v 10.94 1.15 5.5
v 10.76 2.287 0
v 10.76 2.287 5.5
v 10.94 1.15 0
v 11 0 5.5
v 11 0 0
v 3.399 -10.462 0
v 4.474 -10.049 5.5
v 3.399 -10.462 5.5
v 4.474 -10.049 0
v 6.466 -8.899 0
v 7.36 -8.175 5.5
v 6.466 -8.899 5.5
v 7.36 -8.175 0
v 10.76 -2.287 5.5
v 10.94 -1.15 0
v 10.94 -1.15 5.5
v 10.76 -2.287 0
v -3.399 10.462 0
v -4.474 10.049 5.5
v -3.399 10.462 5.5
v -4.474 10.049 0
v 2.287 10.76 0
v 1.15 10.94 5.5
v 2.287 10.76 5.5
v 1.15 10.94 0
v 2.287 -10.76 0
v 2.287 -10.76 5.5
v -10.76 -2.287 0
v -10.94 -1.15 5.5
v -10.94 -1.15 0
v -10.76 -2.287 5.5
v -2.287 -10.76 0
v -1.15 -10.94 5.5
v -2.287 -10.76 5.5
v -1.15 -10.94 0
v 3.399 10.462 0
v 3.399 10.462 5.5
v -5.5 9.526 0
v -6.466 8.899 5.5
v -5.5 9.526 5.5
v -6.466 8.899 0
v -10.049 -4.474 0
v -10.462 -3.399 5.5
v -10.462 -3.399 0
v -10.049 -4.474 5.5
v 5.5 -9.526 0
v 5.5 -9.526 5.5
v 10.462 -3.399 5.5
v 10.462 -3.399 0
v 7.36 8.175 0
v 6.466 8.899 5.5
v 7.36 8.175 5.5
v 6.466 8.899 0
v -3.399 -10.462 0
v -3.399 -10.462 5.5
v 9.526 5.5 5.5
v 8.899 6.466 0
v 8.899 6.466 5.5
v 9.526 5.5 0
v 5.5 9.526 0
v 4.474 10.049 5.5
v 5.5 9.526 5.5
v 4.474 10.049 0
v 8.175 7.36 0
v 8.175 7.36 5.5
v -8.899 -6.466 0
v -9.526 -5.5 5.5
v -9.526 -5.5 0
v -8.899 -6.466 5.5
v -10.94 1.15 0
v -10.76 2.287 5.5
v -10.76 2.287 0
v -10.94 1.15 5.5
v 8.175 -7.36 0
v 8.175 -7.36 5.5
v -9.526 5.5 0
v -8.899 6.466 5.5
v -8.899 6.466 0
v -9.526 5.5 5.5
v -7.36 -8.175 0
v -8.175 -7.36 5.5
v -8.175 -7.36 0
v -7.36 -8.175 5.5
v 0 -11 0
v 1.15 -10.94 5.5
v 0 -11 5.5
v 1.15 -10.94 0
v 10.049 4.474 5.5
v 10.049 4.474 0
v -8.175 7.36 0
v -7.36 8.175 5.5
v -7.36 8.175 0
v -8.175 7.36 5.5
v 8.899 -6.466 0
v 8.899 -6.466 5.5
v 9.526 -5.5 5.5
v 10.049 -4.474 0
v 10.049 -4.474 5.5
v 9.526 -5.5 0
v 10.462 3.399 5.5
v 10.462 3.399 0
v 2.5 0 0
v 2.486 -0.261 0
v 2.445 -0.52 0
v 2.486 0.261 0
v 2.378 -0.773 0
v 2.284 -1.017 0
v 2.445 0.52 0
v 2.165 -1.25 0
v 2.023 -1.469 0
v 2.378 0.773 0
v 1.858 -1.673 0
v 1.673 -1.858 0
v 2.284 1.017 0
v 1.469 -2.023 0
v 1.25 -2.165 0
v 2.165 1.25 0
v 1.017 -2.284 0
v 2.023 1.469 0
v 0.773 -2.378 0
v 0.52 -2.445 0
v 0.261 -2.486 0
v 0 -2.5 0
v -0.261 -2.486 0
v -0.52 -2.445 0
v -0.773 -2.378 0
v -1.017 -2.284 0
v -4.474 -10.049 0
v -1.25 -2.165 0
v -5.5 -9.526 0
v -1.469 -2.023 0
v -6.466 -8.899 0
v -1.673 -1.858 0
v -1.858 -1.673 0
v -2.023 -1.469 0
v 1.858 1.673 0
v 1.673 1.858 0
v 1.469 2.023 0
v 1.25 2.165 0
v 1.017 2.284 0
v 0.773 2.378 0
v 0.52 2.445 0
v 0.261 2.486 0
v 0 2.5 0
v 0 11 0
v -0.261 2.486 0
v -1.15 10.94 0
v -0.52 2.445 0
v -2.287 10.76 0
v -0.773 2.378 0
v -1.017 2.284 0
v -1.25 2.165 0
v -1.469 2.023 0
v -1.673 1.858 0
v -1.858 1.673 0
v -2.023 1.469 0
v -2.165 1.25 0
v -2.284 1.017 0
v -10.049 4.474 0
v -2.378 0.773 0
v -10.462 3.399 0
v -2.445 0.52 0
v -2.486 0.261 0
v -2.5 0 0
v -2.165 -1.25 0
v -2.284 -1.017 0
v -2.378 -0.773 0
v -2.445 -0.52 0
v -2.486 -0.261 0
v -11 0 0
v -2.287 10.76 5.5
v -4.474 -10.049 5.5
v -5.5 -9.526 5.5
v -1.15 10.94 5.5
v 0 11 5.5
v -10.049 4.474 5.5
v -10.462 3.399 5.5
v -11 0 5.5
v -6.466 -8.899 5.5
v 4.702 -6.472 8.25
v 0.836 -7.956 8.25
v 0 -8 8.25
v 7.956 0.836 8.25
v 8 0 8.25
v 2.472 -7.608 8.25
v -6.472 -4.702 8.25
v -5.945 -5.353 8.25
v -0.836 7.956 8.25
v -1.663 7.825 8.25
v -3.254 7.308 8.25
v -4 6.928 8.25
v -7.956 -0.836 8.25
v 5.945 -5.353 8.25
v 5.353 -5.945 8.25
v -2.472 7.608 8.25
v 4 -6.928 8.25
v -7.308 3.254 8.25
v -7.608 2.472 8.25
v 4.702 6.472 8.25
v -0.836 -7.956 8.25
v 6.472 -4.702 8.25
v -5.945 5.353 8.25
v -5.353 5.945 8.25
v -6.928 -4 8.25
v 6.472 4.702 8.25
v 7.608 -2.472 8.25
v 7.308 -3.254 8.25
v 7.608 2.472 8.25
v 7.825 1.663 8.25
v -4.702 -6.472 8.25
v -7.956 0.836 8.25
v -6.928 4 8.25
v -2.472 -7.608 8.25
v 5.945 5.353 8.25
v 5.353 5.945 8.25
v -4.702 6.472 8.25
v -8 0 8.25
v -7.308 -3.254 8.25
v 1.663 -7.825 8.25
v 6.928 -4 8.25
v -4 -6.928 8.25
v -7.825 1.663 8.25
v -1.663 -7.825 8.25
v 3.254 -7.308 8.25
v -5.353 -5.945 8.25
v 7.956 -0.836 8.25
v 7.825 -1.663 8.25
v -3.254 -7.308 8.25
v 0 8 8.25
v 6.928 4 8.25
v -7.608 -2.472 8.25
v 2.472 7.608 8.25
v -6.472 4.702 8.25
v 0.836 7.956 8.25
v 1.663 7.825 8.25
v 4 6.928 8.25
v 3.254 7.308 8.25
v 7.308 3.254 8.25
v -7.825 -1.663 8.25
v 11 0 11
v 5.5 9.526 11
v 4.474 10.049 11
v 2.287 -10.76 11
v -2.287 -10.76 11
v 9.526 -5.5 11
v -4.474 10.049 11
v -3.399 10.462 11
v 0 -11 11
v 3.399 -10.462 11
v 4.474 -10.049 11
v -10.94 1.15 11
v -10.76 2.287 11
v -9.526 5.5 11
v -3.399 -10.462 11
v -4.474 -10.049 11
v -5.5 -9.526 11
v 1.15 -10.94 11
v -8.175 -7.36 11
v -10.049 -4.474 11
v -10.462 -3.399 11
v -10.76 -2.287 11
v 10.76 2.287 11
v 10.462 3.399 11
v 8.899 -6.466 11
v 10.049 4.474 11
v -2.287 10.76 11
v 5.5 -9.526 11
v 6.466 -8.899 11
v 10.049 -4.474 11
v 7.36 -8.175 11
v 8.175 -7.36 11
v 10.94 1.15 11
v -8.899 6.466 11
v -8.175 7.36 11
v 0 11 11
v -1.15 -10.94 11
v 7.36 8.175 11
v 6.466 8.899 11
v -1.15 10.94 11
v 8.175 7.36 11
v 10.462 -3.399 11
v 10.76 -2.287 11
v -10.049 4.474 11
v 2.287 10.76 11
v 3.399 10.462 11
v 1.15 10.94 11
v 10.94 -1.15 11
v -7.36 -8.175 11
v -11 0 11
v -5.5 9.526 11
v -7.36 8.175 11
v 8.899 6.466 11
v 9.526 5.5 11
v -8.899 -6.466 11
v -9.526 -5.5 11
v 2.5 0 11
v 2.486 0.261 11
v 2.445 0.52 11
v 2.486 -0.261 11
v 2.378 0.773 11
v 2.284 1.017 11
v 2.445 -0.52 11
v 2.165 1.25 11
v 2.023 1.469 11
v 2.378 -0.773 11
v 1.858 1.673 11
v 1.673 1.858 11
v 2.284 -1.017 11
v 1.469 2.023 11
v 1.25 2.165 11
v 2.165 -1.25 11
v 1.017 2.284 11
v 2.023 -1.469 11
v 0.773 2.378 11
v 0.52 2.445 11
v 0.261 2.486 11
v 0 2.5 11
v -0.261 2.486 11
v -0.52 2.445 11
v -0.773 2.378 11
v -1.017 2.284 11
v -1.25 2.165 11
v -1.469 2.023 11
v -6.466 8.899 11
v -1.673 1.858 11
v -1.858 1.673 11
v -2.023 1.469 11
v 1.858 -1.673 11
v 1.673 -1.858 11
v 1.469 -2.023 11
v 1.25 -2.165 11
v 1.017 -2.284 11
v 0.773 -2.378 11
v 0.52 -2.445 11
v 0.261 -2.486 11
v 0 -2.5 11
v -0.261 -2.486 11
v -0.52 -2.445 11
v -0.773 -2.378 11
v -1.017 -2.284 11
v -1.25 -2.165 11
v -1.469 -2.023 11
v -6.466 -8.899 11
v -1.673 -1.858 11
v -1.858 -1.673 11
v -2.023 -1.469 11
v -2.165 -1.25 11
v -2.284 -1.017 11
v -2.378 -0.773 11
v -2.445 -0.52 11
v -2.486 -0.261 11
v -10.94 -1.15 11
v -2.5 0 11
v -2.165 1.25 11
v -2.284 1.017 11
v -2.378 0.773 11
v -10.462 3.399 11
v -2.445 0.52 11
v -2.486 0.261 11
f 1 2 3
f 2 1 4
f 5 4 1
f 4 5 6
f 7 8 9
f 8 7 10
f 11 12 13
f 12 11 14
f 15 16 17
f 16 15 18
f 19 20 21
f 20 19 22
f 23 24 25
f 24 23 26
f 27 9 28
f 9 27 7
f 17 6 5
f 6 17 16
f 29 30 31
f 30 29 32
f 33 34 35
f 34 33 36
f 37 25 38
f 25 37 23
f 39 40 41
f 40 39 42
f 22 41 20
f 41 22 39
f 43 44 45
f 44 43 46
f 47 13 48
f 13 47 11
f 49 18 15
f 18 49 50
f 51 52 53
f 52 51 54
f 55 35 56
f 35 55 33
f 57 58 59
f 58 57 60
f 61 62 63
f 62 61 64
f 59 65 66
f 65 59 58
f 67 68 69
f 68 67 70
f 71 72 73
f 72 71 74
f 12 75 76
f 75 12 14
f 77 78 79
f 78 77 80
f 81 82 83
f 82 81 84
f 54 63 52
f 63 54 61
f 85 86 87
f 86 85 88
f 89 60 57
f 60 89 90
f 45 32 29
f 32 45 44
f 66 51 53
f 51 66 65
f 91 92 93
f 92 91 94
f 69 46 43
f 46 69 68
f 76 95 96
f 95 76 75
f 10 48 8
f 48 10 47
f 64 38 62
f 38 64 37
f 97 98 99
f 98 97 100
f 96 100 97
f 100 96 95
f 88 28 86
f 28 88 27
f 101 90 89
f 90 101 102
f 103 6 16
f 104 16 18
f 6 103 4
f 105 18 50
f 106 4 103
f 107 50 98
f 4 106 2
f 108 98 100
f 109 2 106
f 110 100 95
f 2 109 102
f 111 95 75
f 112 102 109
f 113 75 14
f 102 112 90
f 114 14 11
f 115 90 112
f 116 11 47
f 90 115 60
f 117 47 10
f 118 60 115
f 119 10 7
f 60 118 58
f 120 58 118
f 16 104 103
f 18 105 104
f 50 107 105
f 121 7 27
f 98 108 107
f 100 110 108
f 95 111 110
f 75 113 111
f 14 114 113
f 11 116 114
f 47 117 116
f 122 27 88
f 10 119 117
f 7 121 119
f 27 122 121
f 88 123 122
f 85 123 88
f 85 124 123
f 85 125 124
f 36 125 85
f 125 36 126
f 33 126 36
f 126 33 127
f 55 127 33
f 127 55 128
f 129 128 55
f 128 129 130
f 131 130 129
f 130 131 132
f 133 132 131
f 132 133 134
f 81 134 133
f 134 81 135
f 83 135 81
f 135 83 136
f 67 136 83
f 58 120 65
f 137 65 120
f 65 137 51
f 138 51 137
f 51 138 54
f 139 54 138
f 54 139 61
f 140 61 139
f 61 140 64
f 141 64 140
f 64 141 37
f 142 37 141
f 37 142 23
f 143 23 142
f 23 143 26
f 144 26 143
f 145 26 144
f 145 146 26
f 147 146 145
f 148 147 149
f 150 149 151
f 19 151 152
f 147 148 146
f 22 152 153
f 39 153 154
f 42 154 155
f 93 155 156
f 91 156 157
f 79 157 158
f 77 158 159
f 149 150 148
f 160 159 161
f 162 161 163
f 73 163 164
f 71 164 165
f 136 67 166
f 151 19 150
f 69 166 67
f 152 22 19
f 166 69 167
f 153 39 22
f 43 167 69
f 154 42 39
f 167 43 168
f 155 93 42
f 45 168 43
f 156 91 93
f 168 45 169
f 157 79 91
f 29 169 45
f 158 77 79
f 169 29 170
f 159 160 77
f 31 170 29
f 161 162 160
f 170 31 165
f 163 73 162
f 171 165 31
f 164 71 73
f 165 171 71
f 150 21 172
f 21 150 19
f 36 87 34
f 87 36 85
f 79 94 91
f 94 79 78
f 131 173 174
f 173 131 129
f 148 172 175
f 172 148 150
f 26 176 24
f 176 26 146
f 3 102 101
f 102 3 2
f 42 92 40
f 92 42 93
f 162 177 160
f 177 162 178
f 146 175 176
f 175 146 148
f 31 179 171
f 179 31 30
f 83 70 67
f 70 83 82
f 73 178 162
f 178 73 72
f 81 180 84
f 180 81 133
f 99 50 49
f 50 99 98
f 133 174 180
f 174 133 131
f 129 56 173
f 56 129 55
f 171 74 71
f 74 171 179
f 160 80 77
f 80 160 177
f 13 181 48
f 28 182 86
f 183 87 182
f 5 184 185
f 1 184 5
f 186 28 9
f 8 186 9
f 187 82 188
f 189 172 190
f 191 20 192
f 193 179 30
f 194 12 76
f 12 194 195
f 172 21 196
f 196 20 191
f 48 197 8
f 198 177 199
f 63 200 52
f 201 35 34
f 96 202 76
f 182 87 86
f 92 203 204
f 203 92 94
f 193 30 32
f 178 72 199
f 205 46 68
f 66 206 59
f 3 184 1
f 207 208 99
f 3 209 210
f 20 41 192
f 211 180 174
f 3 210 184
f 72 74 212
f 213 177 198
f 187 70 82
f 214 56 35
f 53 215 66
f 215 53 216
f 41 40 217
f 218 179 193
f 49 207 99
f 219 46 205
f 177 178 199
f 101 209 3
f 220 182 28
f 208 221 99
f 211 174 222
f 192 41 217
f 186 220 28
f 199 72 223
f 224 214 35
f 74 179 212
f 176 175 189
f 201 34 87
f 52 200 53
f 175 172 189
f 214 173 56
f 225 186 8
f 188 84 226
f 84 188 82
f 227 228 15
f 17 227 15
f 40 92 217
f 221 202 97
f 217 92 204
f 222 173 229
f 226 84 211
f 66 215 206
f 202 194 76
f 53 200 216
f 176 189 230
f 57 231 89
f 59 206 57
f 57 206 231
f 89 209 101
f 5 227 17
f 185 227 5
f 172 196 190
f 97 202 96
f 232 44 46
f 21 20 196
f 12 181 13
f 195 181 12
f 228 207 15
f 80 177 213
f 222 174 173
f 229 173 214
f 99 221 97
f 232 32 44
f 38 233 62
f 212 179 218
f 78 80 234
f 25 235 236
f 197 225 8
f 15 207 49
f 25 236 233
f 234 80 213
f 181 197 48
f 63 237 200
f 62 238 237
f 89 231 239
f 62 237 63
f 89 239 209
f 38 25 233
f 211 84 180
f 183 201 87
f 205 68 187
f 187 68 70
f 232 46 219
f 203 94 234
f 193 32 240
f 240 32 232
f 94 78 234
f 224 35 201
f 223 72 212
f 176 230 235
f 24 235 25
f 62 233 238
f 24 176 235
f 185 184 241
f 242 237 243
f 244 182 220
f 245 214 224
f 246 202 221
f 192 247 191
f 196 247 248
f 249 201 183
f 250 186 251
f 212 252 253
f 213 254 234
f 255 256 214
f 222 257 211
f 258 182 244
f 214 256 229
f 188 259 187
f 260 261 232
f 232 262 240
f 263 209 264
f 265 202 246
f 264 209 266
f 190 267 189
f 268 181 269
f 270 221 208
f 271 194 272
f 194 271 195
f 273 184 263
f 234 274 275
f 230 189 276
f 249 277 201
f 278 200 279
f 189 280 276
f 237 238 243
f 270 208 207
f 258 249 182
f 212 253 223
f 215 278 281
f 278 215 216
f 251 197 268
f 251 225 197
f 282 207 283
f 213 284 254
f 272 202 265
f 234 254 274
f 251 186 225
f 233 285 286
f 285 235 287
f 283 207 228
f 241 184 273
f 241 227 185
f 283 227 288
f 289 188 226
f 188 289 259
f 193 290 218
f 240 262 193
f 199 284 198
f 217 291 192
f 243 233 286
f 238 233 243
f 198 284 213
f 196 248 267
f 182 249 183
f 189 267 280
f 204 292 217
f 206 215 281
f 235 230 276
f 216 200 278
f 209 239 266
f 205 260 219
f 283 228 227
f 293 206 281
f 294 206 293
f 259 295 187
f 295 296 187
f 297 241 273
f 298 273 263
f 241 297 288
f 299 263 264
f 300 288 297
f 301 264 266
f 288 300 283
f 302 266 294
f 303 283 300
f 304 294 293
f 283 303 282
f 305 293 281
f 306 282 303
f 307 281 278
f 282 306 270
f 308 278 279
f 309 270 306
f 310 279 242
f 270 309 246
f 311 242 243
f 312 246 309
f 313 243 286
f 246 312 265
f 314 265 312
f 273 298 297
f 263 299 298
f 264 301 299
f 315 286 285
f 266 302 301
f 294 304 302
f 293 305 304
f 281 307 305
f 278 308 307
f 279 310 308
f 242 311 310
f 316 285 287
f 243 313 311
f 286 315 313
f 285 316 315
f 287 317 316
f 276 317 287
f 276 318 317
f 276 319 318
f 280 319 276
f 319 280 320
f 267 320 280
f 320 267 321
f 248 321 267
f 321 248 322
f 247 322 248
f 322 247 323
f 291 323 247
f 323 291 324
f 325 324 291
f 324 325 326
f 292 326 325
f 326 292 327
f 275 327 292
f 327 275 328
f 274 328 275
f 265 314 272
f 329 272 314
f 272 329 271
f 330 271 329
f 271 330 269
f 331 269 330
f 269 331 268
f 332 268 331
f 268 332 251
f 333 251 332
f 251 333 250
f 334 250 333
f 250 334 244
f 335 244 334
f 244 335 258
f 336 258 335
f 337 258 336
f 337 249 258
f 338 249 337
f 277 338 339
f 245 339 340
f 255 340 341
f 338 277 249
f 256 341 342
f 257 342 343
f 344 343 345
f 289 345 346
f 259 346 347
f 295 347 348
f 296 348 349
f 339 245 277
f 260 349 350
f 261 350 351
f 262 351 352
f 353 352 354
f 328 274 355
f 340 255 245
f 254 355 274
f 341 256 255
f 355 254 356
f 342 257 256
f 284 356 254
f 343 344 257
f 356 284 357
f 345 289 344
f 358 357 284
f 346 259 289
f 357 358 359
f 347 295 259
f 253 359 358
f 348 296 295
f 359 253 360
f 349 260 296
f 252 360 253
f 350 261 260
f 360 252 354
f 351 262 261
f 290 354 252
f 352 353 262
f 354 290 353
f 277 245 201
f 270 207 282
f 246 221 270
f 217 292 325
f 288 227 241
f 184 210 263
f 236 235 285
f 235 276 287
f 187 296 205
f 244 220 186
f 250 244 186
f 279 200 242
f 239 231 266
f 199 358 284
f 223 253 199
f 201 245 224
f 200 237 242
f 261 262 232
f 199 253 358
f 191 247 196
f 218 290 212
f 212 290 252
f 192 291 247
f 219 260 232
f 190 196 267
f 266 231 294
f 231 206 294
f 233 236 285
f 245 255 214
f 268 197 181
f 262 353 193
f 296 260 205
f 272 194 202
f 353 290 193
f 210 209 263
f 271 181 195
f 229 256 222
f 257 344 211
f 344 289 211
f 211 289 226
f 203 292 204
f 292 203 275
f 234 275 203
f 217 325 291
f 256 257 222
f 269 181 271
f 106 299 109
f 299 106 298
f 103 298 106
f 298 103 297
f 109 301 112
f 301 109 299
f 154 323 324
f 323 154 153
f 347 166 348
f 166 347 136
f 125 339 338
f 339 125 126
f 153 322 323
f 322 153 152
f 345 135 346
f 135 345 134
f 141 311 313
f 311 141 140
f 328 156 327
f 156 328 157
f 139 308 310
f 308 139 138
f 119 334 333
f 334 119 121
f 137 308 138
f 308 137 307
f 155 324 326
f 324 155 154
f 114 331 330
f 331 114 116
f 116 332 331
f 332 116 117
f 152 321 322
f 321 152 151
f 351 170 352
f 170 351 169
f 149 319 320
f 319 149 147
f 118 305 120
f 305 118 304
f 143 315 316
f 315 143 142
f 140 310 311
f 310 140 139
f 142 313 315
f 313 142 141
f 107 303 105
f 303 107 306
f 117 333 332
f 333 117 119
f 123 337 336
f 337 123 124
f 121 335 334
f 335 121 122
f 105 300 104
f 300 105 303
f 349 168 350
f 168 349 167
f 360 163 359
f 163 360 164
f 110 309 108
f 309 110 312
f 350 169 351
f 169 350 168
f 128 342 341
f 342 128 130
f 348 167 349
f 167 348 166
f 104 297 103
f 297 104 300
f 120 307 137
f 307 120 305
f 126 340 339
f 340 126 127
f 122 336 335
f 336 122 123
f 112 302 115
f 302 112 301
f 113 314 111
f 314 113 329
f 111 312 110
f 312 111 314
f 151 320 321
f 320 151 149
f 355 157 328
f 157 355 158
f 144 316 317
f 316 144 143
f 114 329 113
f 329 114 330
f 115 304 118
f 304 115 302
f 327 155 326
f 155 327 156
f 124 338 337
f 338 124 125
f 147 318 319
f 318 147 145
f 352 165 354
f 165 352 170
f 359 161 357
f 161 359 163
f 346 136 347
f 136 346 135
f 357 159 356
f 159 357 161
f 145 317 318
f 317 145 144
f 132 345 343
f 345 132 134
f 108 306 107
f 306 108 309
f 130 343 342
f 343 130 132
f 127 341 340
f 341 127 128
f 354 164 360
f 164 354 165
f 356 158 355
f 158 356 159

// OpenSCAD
// V-groove guide wheel.
$fn = 60;
eps = 0.02;
bore_d = 5;
outer_d = 22;
width = 11;
groove_d = outer_d-6;
difference() {
    union() { cylinder(d=outer_d,h=width/2); translate([0,0,width/2]) cylinder(d1=outer_d,d2=groove_d,h=width/4); translate([0,0,3*width/4]) cylinder(d1=groove_d,d2=outer_d,h=width/4); }
    translate([0,0,-eps]) cylinder(d=bore_d,h=width+2*eps);
}
